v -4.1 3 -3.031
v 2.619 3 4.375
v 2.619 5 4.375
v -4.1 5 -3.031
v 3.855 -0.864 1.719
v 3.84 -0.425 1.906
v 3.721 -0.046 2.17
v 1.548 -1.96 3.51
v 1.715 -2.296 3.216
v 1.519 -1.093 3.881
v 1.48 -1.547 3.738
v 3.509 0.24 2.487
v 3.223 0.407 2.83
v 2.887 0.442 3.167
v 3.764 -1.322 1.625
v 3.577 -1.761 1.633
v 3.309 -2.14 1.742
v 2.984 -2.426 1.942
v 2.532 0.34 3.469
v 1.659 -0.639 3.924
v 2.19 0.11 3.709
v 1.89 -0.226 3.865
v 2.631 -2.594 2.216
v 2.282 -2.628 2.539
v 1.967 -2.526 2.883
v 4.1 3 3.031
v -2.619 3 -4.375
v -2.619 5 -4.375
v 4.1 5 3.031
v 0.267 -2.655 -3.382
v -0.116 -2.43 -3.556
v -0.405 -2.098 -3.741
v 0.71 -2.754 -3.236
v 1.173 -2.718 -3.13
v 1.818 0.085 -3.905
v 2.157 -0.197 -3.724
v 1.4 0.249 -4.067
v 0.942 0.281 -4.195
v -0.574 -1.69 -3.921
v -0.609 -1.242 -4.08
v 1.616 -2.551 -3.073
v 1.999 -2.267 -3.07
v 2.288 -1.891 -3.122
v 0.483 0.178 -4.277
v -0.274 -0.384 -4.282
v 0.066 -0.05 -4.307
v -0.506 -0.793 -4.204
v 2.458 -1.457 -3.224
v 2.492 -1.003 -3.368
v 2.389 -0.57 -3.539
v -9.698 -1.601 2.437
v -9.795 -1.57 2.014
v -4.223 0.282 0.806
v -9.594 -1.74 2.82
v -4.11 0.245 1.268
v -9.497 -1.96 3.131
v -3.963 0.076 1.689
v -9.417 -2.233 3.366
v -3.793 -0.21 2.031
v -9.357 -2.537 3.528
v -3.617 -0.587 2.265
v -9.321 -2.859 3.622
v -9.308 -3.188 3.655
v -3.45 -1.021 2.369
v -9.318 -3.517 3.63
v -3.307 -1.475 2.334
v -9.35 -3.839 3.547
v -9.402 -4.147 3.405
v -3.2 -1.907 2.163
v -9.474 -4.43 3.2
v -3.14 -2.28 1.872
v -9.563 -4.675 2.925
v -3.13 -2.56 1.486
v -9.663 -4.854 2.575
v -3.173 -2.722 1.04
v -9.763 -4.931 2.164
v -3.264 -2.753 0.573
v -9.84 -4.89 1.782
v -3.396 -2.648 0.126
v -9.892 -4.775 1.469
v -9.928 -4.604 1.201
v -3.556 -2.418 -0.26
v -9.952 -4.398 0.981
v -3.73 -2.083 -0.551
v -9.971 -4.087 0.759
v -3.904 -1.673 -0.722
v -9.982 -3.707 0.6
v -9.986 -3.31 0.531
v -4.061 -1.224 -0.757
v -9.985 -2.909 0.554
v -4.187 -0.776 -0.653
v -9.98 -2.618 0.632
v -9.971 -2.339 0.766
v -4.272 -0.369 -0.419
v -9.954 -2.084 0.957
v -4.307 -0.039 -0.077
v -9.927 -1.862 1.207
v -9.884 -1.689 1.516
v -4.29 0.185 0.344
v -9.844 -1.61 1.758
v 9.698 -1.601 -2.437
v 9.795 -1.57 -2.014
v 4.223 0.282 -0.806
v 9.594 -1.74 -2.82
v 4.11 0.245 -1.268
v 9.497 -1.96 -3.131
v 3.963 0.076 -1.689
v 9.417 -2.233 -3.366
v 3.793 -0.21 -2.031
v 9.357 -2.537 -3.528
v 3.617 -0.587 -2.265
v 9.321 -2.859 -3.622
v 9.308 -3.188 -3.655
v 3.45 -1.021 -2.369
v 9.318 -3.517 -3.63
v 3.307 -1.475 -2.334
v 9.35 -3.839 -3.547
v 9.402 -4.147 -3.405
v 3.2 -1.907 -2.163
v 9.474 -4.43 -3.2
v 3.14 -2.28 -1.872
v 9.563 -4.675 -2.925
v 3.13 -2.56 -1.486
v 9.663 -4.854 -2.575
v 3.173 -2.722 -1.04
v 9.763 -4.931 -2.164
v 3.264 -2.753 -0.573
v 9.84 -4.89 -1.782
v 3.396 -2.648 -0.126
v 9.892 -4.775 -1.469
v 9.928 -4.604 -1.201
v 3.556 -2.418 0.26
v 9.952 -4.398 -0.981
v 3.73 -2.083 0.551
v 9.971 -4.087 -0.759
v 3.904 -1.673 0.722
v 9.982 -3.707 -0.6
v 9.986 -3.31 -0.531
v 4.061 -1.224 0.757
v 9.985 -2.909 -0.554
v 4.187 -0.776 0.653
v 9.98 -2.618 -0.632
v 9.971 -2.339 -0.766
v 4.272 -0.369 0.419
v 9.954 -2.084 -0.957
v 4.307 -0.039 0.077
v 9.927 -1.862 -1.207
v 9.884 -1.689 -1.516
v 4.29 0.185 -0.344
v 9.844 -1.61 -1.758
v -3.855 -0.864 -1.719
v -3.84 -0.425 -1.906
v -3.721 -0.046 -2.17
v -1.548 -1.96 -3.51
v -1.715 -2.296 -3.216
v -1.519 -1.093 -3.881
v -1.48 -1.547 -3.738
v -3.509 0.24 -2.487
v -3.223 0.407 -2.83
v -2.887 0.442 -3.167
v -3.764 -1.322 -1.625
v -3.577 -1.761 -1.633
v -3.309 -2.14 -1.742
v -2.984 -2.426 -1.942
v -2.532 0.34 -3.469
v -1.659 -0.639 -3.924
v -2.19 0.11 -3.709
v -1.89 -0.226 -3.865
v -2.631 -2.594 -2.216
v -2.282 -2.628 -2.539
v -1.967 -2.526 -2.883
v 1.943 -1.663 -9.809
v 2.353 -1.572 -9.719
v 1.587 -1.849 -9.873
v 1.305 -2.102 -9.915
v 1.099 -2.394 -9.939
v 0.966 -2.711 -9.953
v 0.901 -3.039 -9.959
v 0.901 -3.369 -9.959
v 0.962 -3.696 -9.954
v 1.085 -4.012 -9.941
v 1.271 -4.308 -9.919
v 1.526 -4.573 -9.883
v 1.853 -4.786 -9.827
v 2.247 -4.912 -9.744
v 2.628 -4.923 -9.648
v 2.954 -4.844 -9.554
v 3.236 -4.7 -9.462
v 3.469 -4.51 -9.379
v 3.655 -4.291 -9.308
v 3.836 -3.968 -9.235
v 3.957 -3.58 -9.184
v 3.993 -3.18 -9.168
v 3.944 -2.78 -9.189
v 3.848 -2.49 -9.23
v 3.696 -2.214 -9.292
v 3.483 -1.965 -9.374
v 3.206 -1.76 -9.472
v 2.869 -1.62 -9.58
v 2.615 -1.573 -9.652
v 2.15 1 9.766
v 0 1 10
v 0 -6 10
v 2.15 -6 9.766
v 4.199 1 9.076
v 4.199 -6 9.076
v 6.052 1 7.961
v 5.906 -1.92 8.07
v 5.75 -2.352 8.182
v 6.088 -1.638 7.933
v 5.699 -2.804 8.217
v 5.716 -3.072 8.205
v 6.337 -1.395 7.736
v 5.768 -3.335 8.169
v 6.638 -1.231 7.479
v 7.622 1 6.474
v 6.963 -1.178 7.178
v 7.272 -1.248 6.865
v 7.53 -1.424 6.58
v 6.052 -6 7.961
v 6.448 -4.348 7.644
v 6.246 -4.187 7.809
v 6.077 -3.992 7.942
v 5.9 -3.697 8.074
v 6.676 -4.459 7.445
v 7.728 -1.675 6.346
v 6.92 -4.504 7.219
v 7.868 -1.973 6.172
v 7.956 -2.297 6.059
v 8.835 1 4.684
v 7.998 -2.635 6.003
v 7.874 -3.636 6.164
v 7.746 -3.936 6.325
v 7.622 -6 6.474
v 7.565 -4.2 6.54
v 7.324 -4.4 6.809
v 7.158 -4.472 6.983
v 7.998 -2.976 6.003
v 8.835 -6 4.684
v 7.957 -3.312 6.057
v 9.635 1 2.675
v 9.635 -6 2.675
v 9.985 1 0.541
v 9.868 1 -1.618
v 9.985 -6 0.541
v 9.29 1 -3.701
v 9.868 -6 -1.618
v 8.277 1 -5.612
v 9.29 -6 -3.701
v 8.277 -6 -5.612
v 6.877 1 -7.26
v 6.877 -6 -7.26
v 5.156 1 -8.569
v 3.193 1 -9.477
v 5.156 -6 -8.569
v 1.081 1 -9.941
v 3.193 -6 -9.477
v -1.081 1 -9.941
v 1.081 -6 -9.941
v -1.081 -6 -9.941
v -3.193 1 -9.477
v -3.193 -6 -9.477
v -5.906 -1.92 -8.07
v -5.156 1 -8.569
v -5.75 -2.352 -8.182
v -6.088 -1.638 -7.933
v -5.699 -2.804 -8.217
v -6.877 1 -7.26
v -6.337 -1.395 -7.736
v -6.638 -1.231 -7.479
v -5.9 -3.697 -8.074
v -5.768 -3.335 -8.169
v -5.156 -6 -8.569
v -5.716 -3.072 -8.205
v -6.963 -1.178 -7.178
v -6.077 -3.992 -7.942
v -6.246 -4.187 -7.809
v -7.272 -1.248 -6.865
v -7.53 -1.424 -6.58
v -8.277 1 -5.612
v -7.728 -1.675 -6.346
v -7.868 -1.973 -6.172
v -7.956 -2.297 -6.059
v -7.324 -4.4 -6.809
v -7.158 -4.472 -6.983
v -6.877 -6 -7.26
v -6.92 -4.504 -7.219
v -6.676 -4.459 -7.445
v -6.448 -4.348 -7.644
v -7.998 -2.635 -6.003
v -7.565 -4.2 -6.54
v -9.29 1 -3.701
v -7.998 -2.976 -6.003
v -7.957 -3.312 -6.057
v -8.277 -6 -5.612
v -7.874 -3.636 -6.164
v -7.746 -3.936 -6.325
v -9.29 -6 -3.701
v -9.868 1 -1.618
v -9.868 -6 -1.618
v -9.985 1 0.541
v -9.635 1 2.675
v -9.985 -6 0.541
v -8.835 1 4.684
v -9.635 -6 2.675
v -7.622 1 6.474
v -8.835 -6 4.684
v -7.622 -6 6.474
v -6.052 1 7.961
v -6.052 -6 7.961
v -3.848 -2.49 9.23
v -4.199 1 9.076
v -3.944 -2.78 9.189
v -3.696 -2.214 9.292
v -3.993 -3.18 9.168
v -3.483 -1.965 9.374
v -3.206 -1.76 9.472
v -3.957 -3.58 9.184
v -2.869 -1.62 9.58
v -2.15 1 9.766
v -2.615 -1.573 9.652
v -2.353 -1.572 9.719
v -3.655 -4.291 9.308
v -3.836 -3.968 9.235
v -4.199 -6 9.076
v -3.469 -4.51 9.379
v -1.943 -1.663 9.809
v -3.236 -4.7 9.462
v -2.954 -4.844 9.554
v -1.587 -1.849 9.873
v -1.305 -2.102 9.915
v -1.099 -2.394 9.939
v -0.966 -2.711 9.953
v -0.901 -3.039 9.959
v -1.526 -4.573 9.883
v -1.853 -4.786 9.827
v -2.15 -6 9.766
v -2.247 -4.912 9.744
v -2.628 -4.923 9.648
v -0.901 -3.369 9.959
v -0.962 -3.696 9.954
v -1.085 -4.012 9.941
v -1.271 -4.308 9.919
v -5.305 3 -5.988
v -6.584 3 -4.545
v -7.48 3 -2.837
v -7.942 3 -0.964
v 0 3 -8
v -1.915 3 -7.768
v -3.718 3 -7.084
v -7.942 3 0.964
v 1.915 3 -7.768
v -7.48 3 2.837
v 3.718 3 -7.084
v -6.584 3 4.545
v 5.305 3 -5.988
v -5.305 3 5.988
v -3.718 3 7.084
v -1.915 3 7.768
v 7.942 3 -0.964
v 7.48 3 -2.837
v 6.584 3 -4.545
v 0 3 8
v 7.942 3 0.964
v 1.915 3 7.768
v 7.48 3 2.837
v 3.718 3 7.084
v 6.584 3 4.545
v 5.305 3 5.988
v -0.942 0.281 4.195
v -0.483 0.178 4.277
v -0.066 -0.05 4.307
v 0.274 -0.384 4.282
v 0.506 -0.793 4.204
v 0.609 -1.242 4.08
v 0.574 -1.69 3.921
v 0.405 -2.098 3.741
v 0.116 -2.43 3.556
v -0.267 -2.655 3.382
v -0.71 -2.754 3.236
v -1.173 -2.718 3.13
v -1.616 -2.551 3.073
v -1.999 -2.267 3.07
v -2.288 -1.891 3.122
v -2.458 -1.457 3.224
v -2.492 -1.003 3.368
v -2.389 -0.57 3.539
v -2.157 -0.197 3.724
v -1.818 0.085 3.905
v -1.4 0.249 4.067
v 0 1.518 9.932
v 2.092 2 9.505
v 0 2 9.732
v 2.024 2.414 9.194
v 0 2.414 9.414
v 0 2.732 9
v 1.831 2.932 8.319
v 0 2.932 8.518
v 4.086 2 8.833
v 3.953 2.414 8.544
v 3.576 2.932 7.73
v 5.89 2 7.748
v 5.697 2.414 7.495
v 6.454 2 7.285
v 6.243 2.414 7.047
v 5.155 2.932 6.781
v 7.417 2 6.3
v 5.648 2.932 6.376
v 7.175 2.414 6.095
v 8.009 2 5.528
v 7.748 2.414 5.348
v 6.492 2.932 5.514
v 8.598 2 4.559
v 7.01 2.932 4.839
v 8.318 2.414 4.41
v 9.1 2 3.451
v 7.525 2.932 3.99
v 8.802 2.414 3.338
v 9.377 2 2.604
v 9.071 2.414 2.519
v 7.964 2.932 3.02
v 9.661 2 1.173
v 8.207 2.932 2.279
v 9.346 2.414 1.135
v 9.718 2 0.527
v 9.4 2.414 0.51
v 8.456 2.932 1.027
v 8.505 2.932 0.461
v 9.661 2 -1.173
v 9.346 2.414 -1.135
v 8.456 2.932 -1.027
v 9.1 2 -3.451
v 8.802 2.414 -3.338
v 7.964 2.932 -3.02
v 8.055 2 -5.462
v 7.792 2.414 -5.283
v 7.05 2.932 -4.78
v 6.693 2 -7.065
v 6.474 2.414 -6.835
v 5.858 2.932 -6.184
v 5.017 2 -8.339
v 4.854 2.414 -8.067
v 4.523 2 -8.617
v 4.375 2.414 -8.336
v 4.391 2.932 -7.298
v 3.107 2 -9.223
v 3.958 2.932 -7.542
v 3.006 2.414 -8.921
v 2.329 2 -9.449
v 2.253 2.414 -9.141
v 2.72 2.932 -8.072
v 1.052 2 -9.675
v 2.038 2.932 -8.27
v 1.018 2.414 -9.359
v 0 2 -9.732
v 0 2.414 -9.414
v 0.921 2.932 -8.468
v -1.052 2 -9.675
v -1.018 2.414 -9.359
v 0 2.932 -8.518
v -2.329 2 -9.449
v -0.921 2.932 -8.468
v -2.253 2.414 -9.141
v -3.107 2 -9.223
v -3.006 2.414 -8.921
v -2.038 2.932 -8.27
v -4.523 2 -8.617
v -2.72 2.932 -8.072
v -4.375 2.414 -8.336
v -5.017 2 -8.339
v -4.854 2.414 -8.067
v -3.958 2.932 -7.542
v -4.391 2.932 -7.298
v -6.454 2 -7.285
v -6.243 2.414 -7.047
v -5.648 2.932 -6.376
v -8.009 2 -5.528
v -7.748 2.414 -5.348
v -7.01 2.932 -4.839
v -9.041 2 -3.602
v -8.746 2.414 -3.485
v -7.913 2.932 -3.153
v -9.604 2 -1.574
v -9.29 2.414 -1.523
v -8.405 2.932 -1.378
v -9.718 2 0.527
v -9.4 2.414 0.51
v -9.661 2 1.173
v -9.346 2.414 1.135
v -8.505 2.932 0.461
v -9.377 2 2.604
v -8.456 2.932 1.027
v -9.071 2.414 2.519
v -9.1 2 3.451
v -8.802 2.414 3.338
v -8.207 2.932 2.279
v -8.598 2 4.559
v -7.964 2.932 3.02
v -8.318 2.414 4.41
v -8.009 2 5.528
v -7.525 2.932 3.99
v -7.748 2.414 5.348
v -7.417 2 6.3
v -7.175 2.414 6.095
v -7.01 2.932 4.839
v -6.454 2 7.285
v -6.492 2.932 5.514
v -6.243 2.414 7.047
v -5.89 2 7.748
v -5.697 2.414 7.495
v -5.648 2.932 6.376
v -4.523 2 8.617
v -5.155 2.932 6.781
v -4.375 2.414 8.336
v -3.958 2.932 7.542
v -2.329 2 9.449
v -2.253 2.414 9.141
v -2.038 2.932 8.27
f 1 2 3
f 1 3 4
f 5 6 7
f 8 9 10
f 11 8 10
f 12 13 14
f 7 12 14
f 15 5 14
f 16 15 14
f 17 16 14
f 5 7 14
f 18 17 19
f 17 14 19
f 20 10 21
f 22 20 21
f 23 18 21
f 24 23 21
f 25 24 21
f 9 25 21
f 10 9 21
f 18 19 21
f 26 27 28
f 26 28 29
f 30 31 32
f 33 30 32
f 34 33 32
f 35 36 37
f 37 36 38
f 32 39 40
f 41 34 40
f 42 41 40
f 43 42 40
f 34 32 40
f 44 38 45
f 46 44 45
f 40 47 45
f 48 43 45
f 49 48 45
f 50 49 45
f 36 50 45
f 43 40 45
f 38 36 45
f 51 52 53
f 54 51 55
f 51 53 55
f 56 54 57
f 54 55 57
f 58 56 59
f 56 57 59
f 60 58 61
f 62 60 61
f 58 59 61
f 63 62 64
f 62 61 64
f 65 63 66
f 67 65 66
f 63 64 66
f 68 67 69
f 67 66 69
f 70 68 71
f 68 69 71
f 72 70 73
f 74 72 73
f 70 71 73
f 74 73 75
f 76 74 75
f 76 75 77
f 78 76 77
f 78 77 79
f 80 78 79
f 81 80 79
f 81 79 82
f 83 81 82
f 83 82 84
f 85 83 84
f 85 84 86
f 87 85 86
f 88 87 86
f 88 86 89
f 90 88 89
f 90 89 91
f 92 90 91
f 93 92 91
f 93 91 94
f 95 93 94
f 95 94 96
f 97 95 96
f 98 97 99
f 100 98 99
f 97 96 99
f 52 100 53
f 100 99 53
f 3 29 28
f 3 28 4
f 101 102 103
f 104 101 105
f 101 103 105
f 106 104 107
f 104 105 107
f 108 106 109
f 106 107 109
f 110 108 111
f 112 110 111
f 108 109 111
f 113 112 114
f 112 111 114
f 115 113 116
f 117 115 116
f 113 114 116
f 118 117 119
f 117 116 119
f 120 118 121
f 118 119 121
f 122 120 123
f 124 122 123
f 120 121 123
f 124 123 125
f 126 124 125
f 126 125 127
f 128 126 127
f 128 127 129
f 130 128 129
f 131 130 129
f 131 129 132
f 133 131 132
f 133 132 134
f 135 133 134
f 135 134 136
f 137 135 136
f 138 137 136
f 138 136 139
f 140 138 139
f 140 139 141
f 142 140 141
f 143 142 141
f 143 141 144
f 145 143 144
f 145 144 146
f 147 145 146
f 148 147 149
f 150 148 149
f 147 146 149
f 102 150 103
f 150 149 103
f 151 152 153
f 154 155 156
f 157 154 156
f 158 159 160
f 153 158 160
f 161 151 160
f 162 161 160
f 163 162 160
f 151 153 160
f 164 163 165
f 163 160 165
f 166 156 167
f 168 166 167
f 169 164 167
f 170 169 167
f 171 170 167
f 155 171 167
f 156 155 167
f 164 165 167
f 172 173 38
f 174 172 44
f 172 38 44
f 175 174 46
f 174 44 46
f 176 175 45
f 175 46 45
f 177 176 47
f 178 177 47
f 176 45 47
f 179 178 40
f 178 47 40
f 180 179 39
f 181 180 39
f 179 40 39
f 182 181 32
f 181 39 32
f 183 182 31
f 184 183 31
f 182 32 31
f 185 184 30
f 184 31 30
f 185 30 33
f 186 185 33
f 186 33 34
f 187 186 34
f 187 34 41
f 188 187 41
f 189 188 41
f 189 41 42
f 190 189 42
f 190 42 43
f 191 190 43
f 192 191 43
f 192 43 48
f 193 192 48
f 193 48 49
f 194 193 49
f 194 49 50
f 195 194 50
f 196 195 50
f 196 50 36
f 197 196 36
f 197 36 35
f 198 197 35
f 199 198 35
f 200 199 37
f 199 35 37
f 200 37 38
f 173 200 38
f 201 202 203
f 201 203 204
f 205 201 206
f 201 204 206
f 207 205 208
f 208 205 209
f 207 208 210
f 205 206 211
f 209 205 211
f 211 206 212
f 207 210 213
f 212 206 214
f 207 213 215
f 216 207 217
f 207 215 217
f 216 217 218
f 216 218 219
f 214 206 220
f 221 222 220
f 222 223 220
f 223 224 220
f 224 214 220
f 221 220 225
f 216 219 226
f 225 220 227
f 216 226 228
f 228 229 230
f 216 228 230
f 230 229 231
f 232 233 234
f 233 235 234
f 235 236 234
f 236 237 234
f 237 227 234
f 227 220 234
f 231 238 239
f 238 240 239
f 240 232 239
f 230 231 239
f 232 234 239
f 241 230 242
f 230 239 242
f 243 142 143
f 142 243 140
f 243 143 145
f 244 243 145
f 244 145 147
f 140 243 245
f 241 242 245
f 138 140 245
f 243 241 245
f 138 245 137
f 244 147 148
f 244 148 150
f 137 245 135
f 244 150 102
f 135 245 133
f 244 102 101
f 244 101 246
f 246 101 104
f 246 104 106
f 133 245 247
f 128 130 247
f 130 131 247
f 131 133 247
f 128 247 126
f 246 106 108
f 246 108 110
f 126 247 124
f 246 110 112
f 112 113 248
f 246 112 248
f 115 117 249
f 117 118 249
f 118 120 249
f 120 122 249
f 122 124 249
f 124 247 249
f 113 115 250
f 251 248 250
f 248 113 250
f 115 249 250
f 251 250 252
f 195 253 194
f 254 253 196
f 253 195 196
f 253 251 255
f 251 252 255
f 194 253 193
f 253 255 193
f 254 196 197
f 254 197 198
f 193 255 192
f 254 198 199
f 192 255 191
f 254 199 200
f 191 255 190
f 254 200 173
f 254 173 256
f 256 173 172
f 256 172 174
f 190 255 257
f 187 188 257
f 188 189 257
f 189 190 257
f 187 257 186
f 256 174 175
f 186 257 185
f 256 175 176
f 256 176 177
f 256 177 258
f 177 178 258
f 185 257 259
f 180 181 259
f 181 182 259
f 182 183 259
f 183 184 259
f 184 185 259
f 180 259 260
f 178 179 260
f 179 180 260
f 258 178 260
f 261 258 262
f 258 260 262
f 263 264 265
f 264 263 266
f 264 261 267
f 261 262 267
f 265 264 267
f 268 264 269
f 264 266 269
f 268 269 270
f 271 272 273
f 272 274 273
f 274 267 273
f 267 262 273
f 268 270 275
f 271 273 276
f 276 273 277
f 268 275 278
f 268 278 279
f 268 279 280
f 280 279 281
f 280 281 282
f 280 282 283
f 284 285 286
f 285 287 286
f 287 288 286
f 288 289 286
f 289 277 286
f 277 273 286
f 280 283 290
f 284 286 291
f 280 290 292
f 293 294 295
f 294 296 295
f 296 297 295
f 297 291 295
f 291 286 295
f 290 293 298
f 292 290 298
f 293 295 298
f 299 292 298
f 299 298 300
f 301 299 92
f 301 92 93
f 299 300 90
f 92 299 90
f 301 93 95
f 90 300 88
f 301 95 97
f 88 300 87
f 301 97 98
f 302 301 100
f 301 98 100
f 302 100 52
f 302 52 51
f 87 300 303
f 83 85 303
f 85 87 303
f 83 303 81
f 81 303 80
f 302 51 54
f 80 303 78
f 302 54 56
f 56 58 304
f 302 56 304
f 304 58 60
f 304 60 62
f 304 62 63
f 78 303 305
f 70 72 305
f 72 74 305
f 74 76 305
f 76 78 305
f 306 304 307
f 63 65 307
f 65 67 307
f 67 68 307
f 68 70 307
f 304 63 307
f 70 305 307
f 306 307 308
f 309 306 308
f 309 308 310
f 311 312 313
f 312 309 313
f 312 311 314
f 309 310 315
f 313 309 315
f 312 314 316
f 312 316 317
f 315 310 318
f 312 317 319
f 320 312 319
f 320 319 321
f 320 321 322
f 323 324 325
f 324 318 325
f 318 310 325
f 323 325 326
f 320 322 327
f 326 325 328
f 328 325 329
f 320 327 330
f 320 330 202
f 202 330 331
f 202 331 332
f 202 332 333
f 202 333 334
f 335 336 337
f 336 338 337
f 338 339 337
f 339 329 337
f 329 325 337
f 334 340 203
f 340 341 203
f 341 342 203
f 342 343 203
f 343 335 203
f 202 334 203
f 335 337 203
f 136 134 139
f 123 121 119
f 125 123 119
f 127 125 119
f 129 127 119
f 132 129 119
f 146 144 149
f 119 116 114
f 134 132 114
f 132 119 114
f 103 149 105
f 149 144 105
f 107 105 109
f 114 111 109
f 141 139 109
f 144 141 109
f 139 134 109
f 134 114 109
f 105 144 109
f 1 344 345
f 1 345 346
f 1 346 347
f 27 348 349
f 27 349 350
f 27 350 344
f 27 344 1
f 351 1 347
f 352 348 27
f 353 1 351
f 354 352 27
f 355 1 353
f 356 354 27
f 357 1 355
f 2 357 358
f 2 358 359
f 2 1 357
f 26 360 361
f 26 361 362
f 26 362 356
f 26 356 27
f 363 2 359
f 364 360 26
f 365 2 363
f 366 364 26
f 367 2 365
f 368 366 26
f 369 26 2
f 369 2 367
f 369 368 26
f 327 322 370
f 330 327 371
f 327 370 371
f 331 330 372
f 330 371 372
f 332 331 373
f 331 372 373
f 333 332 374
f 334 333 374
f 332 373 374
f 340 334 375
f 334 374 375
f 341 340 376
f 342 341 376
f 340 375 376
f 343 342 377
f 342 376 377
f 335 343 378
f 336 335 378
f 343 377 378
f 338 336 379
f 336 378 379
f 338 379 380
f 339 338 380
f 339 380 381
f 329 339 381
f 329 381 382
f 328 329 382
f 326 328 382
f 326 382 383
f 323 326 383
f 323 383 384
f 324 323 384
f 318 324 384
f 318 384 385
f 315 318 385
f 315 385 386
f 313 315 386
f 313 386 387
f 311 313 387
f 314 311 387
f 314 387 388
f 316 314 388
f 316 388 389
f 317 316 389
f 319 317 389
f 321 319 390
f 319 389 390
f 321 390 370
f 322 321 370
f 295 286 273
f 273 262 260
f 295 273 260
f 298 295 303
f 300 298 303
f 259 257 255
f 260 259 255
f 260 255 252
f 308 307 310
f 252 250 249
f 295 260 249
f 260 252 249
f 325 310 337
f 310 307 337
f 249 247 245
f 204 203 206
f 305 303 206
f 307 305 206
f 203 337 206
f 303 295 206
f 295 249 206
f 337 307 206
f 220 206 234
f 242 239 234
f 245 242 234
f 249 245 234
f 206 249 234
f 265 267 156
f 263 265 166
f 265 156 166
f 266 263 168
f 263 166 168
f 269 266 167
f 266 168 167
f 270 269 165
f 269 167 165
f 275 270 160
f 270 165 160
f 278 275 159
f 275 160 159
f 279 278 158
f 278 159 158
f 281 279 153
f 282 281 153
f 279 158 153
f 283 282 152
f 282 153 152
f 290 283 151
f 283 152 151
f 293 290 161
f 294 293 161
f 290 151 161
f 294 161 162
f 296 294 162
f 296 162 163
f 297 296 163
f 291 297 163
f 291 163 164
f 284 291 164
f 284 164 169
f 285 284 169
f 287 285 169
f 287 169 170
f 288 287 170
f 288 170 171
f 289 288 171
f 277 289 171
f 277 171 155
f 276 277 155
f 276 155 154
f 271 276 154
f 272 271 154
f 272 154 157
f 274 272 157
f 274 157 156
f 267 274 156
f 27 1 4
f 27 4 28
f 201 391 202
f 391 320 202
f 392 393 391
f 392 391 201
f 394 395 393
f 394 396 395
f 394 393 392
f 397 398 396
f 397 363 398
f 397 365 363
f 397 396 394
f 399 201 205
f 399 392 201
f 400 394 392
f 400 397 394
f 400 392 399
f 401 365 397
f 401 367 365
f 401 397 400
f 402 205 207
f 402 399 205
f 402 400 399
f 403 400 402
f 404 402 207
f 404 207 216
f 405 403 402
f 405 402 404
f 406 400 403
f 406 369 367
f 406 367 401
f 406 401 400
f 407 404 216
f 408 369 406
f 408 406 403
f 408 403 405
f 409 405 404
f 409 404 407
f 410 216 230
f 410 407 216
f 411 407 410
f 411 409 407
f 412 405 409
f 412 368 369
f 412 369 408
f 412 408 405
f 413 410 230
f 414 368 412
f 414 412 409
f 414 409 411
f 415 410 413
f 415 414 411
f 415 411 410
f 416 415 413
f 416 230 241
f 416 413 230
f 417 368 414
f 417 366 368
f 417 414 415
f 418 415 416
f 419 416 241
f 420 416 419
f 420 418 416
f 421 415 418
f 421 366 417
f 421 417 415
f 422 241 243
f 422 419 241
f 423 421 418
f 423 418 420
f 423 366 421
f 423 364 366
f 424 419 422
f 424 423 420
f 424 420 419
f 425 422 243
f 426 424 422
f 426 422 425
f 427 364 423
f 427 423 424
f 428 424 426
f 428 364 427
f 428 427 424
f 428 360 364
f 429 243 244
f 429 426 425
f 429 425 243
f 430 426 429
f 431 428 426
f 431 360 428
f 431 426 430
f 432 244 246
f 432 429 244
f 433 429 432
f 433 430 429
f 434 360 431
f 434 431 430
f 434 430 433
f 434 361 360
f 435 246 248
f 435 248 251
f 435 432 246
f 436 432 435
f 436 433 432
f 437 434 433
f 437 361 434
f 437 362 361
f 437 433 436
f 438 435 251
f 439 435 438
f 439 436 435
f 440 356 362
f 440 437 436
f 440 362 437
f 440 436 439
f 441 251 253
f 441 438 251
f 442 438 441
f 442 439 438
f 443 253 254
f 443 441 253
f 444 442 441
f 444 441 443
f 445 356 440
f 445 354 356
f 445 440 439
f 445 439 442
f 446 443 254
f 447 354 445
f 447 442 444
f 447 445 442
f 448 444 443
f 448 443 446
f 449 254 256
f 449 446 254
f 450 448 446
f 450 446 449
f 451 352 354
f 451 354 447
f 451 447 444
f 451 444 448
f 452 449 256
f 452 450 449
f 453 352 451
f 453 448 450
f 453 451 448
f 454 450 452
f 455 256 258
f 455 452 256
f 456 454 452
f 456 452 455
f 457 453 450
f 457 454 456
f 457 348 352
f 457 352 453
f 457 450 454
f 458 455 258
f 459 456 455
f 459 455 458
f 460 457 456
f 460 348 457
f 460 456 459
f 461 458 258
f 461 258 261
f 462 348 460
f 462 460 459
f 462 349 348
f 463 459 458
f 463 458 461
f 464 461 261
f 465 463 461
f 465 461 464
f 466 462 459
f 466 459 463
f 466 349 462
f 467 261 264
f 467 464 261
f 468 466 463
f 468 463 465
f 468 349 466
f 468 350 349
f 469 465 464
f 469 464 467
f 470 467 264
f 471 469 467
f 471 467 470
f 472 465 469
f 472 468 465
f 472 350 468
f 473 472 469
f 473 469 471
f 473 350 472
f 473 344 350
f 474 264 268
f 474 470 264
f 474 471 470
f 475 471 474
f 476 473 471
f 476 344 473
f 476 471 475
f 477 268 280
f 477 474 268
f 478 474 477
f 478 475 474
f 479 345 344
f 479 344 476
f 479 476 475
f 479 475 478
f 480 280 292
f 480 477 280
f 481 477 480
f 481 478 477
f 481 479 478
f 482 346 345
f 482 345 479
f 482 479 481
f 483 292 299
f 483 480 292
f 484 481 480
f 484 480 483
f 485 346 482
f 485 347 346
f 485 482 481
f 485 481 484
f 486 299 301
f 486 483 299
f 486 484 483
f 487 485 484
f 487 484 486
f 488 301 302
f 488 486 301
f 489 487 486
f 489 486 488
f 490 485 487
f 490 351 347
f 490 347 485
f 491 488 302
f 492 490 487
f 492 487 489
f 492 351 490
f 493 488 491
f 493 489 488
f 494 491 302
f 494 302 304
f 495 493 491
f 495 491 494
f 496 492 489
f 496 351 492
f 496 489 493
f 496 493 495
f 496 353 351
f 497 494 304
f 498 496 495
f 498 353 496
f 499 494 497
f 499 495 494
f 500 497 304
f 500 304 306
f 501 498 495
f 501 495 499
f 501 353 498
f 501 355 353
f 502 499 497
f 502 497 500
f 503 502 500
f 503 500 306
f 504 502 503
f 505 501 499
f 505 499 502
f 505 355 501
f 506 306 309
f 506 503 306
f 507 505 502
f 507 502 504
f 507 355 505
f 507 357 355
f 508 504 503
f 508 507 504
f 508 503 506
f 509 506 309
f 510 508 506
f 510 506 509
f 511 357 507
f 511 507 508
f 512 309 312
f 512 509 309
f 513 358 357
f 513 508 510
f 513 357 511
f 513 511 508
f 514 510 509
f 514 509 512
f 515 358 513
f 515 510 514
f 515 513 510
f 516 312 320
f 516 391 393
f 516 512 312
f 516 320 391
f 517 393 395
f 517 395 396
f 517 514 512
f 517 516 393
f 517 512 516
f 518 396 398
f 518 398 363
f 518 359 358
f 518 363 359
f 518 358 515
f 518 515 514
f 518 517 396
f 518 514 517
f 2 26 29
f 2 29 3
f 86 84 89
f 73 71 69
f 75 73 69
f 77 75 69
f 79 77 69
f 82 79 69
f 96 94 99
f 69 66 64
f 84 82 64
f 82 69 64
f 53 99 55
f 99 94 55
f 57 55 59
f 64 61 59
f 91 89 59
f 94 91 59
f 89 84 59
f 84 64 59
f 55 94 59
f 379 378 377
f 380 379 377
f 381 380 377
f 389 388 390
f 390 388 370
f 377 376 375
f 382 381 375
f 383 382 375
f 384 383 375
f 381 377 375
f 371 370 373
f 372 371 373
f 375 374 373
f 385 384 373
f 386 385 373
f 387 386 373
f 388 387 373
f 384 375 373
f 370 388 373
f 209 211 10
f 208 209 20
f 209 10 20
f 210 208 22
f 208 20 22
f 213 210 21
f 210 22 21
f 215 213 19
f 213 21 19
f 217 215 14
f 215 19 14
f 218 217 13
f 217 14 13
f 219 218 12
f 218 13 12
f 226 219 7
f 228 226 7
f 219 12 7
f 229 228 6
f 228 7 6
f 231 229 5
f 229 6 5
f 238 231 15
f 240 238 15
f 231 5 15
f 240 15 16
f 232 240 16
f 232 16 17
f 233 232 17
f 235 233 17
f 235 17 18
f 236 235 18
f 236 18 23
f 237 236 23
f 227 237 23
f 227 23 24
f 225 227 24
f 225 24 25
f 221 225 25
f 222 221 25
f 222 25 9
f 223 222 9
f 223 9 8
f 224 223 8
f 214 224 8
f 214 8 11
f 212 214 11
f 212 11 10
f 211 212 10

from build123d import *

# Parameters (mm, degrees)
BASE_DEPTH          = 3
BASE_DEPTH_BACK     = 6
SKETCH1_R           = 10
SKETCH2_R           = 1.6
HOLE1_DEPTH         = 19.646604683
HOLE1MIRROR_COUNT   = 2
SKETCH3_R           = 1.6
HOLE2_DEPTH         = 19.158121362
HOLE2MIRROR_COUNT   = 2
SKETCH4_R           = 1.6
HOLE3_DEPTH         = 19.100993715
HOLE3MIRROR_COUNT   = 2
FILLET1_R           = 2
BOSS_EXTRUDE1_DEPTH = 2


with BuildPart() as part:
    # Sketch1 → base (new, two sides: drawn at the far end of the back side and taken through both)
    with BuildSketch(Plane(origin=(0, 0, 0), x_dir=(1, 0, 0), z_dir=(0, 1, 0)).offset(-BASE_DEPTH_BACK)):
        Circle(SKETCH1_R)
    extrude(amount=BASE_DEPTH + BASE_DEPTH_BACK)

    # Sketch2 → hole1 (cut, through all)
    with BuildSketch(Plane(origin=(2.670502563, -1.093066116, 2.770130417), x_dir=(-0.6558691872850446, 0.22429081675253856, 0.7207837669443827), z_dir=(-0.6676256406563905, 0.27326652891267483, -0.692532604369038))):
        Circle(SKETCH2_R)
    hole1 = extrude(amount=-HOLE1_DEPTH, mode=Mode.SUBTRACT)

    # hole1mirror: hole1 ×2 about axis
    hole1mirror_axis = Axis((0, 5.5, 0), (0, -1, 0))
    for i in range(1, HOLE1MIRROR_COUNT):
        add(hole1.rotate(hole1mirror_axis, i * 360 / HOLE1MIRROR_COUNT), mode=Mode.SUBTRACT)

    # Sketch3 → hole2 (cut, through all)
    with BuildSketch(Plane(origin=(-0.941672921, -1.236067977, 3.685836142), x_dir=(-0.9718935871364875, 0.07382318789513377, -0.22354639834264944), z_dir=(0.23541823021467095, 0.3090169943749464, -0.921459035481267))):
        Circle(SKETCH3_R)
    hole2 = extrude(amount=-HOLE2_DEPTH, mode=Mode.SUBTRACT)

    # hole2mirror: hole2 ×2 about axis
    hole2mirror_axis = Axis((0, 5.5, 0), (0, -1, 0))
    for i in range(1, HOLE2MIRROR_COUNT):
        add(hole2.rotate(hole2mirror_axis, i * 360 / HOLE2MIRROR_COUNT), mode=Mode.SUBTRACT)

    # Sketch4 → hole3 (cut, through all)
    with BuildSketch(Plane(origin=(-3.717841, -1.236067977, 0.806098168), x_dir=(-0.19123247894507908, -0.06357892752956036, -0.979483465389136), z_dir=(0.9294602499075393, 0.30901699437494623, -0.20152454200243008))):
        Circle(SKETCH4_R)
    hole3 = extrude(amount=-HOLE3_DEPTH, mode=Mode.SUBTRACT)

    # hole3mirror: hole3 ×2 about axis
    hole3mirror_axis = Axis((0, 5.5, 0), (0, -1, 0))
    for i in range(1, HOLE3MIRROR_COUNT):
        add(hole3.rotate(hole3mirror_axis, i * 360 / HOLE3MIRROR_COUNT), mode=Mode.SUBTRACT)

    # Fillet1
    fillet1_edges = [part.edges().sort_by_distance(p)[0] for p in [
        (-10, 3, 0),
    ]]
    fillet(fillet1_edges, radius=FILLET1_R)

    # Sketch6 → Boss-Extrude1 (add)
    with BuildSketch(Plane(origin=(0, 3, 0), x_dir=(1, 0, 0), z_dir=(0, 1, 0))):
        Polygon((-4.100143947, 3.031306586), (-2.61886111, 4.375107597), (4.100143947, -3.031306586), (2.61886111, -4.375107597), align=None)
    extrude(amount=BOSS_EXTRUDE1_DEPTH)


solid = part.part
